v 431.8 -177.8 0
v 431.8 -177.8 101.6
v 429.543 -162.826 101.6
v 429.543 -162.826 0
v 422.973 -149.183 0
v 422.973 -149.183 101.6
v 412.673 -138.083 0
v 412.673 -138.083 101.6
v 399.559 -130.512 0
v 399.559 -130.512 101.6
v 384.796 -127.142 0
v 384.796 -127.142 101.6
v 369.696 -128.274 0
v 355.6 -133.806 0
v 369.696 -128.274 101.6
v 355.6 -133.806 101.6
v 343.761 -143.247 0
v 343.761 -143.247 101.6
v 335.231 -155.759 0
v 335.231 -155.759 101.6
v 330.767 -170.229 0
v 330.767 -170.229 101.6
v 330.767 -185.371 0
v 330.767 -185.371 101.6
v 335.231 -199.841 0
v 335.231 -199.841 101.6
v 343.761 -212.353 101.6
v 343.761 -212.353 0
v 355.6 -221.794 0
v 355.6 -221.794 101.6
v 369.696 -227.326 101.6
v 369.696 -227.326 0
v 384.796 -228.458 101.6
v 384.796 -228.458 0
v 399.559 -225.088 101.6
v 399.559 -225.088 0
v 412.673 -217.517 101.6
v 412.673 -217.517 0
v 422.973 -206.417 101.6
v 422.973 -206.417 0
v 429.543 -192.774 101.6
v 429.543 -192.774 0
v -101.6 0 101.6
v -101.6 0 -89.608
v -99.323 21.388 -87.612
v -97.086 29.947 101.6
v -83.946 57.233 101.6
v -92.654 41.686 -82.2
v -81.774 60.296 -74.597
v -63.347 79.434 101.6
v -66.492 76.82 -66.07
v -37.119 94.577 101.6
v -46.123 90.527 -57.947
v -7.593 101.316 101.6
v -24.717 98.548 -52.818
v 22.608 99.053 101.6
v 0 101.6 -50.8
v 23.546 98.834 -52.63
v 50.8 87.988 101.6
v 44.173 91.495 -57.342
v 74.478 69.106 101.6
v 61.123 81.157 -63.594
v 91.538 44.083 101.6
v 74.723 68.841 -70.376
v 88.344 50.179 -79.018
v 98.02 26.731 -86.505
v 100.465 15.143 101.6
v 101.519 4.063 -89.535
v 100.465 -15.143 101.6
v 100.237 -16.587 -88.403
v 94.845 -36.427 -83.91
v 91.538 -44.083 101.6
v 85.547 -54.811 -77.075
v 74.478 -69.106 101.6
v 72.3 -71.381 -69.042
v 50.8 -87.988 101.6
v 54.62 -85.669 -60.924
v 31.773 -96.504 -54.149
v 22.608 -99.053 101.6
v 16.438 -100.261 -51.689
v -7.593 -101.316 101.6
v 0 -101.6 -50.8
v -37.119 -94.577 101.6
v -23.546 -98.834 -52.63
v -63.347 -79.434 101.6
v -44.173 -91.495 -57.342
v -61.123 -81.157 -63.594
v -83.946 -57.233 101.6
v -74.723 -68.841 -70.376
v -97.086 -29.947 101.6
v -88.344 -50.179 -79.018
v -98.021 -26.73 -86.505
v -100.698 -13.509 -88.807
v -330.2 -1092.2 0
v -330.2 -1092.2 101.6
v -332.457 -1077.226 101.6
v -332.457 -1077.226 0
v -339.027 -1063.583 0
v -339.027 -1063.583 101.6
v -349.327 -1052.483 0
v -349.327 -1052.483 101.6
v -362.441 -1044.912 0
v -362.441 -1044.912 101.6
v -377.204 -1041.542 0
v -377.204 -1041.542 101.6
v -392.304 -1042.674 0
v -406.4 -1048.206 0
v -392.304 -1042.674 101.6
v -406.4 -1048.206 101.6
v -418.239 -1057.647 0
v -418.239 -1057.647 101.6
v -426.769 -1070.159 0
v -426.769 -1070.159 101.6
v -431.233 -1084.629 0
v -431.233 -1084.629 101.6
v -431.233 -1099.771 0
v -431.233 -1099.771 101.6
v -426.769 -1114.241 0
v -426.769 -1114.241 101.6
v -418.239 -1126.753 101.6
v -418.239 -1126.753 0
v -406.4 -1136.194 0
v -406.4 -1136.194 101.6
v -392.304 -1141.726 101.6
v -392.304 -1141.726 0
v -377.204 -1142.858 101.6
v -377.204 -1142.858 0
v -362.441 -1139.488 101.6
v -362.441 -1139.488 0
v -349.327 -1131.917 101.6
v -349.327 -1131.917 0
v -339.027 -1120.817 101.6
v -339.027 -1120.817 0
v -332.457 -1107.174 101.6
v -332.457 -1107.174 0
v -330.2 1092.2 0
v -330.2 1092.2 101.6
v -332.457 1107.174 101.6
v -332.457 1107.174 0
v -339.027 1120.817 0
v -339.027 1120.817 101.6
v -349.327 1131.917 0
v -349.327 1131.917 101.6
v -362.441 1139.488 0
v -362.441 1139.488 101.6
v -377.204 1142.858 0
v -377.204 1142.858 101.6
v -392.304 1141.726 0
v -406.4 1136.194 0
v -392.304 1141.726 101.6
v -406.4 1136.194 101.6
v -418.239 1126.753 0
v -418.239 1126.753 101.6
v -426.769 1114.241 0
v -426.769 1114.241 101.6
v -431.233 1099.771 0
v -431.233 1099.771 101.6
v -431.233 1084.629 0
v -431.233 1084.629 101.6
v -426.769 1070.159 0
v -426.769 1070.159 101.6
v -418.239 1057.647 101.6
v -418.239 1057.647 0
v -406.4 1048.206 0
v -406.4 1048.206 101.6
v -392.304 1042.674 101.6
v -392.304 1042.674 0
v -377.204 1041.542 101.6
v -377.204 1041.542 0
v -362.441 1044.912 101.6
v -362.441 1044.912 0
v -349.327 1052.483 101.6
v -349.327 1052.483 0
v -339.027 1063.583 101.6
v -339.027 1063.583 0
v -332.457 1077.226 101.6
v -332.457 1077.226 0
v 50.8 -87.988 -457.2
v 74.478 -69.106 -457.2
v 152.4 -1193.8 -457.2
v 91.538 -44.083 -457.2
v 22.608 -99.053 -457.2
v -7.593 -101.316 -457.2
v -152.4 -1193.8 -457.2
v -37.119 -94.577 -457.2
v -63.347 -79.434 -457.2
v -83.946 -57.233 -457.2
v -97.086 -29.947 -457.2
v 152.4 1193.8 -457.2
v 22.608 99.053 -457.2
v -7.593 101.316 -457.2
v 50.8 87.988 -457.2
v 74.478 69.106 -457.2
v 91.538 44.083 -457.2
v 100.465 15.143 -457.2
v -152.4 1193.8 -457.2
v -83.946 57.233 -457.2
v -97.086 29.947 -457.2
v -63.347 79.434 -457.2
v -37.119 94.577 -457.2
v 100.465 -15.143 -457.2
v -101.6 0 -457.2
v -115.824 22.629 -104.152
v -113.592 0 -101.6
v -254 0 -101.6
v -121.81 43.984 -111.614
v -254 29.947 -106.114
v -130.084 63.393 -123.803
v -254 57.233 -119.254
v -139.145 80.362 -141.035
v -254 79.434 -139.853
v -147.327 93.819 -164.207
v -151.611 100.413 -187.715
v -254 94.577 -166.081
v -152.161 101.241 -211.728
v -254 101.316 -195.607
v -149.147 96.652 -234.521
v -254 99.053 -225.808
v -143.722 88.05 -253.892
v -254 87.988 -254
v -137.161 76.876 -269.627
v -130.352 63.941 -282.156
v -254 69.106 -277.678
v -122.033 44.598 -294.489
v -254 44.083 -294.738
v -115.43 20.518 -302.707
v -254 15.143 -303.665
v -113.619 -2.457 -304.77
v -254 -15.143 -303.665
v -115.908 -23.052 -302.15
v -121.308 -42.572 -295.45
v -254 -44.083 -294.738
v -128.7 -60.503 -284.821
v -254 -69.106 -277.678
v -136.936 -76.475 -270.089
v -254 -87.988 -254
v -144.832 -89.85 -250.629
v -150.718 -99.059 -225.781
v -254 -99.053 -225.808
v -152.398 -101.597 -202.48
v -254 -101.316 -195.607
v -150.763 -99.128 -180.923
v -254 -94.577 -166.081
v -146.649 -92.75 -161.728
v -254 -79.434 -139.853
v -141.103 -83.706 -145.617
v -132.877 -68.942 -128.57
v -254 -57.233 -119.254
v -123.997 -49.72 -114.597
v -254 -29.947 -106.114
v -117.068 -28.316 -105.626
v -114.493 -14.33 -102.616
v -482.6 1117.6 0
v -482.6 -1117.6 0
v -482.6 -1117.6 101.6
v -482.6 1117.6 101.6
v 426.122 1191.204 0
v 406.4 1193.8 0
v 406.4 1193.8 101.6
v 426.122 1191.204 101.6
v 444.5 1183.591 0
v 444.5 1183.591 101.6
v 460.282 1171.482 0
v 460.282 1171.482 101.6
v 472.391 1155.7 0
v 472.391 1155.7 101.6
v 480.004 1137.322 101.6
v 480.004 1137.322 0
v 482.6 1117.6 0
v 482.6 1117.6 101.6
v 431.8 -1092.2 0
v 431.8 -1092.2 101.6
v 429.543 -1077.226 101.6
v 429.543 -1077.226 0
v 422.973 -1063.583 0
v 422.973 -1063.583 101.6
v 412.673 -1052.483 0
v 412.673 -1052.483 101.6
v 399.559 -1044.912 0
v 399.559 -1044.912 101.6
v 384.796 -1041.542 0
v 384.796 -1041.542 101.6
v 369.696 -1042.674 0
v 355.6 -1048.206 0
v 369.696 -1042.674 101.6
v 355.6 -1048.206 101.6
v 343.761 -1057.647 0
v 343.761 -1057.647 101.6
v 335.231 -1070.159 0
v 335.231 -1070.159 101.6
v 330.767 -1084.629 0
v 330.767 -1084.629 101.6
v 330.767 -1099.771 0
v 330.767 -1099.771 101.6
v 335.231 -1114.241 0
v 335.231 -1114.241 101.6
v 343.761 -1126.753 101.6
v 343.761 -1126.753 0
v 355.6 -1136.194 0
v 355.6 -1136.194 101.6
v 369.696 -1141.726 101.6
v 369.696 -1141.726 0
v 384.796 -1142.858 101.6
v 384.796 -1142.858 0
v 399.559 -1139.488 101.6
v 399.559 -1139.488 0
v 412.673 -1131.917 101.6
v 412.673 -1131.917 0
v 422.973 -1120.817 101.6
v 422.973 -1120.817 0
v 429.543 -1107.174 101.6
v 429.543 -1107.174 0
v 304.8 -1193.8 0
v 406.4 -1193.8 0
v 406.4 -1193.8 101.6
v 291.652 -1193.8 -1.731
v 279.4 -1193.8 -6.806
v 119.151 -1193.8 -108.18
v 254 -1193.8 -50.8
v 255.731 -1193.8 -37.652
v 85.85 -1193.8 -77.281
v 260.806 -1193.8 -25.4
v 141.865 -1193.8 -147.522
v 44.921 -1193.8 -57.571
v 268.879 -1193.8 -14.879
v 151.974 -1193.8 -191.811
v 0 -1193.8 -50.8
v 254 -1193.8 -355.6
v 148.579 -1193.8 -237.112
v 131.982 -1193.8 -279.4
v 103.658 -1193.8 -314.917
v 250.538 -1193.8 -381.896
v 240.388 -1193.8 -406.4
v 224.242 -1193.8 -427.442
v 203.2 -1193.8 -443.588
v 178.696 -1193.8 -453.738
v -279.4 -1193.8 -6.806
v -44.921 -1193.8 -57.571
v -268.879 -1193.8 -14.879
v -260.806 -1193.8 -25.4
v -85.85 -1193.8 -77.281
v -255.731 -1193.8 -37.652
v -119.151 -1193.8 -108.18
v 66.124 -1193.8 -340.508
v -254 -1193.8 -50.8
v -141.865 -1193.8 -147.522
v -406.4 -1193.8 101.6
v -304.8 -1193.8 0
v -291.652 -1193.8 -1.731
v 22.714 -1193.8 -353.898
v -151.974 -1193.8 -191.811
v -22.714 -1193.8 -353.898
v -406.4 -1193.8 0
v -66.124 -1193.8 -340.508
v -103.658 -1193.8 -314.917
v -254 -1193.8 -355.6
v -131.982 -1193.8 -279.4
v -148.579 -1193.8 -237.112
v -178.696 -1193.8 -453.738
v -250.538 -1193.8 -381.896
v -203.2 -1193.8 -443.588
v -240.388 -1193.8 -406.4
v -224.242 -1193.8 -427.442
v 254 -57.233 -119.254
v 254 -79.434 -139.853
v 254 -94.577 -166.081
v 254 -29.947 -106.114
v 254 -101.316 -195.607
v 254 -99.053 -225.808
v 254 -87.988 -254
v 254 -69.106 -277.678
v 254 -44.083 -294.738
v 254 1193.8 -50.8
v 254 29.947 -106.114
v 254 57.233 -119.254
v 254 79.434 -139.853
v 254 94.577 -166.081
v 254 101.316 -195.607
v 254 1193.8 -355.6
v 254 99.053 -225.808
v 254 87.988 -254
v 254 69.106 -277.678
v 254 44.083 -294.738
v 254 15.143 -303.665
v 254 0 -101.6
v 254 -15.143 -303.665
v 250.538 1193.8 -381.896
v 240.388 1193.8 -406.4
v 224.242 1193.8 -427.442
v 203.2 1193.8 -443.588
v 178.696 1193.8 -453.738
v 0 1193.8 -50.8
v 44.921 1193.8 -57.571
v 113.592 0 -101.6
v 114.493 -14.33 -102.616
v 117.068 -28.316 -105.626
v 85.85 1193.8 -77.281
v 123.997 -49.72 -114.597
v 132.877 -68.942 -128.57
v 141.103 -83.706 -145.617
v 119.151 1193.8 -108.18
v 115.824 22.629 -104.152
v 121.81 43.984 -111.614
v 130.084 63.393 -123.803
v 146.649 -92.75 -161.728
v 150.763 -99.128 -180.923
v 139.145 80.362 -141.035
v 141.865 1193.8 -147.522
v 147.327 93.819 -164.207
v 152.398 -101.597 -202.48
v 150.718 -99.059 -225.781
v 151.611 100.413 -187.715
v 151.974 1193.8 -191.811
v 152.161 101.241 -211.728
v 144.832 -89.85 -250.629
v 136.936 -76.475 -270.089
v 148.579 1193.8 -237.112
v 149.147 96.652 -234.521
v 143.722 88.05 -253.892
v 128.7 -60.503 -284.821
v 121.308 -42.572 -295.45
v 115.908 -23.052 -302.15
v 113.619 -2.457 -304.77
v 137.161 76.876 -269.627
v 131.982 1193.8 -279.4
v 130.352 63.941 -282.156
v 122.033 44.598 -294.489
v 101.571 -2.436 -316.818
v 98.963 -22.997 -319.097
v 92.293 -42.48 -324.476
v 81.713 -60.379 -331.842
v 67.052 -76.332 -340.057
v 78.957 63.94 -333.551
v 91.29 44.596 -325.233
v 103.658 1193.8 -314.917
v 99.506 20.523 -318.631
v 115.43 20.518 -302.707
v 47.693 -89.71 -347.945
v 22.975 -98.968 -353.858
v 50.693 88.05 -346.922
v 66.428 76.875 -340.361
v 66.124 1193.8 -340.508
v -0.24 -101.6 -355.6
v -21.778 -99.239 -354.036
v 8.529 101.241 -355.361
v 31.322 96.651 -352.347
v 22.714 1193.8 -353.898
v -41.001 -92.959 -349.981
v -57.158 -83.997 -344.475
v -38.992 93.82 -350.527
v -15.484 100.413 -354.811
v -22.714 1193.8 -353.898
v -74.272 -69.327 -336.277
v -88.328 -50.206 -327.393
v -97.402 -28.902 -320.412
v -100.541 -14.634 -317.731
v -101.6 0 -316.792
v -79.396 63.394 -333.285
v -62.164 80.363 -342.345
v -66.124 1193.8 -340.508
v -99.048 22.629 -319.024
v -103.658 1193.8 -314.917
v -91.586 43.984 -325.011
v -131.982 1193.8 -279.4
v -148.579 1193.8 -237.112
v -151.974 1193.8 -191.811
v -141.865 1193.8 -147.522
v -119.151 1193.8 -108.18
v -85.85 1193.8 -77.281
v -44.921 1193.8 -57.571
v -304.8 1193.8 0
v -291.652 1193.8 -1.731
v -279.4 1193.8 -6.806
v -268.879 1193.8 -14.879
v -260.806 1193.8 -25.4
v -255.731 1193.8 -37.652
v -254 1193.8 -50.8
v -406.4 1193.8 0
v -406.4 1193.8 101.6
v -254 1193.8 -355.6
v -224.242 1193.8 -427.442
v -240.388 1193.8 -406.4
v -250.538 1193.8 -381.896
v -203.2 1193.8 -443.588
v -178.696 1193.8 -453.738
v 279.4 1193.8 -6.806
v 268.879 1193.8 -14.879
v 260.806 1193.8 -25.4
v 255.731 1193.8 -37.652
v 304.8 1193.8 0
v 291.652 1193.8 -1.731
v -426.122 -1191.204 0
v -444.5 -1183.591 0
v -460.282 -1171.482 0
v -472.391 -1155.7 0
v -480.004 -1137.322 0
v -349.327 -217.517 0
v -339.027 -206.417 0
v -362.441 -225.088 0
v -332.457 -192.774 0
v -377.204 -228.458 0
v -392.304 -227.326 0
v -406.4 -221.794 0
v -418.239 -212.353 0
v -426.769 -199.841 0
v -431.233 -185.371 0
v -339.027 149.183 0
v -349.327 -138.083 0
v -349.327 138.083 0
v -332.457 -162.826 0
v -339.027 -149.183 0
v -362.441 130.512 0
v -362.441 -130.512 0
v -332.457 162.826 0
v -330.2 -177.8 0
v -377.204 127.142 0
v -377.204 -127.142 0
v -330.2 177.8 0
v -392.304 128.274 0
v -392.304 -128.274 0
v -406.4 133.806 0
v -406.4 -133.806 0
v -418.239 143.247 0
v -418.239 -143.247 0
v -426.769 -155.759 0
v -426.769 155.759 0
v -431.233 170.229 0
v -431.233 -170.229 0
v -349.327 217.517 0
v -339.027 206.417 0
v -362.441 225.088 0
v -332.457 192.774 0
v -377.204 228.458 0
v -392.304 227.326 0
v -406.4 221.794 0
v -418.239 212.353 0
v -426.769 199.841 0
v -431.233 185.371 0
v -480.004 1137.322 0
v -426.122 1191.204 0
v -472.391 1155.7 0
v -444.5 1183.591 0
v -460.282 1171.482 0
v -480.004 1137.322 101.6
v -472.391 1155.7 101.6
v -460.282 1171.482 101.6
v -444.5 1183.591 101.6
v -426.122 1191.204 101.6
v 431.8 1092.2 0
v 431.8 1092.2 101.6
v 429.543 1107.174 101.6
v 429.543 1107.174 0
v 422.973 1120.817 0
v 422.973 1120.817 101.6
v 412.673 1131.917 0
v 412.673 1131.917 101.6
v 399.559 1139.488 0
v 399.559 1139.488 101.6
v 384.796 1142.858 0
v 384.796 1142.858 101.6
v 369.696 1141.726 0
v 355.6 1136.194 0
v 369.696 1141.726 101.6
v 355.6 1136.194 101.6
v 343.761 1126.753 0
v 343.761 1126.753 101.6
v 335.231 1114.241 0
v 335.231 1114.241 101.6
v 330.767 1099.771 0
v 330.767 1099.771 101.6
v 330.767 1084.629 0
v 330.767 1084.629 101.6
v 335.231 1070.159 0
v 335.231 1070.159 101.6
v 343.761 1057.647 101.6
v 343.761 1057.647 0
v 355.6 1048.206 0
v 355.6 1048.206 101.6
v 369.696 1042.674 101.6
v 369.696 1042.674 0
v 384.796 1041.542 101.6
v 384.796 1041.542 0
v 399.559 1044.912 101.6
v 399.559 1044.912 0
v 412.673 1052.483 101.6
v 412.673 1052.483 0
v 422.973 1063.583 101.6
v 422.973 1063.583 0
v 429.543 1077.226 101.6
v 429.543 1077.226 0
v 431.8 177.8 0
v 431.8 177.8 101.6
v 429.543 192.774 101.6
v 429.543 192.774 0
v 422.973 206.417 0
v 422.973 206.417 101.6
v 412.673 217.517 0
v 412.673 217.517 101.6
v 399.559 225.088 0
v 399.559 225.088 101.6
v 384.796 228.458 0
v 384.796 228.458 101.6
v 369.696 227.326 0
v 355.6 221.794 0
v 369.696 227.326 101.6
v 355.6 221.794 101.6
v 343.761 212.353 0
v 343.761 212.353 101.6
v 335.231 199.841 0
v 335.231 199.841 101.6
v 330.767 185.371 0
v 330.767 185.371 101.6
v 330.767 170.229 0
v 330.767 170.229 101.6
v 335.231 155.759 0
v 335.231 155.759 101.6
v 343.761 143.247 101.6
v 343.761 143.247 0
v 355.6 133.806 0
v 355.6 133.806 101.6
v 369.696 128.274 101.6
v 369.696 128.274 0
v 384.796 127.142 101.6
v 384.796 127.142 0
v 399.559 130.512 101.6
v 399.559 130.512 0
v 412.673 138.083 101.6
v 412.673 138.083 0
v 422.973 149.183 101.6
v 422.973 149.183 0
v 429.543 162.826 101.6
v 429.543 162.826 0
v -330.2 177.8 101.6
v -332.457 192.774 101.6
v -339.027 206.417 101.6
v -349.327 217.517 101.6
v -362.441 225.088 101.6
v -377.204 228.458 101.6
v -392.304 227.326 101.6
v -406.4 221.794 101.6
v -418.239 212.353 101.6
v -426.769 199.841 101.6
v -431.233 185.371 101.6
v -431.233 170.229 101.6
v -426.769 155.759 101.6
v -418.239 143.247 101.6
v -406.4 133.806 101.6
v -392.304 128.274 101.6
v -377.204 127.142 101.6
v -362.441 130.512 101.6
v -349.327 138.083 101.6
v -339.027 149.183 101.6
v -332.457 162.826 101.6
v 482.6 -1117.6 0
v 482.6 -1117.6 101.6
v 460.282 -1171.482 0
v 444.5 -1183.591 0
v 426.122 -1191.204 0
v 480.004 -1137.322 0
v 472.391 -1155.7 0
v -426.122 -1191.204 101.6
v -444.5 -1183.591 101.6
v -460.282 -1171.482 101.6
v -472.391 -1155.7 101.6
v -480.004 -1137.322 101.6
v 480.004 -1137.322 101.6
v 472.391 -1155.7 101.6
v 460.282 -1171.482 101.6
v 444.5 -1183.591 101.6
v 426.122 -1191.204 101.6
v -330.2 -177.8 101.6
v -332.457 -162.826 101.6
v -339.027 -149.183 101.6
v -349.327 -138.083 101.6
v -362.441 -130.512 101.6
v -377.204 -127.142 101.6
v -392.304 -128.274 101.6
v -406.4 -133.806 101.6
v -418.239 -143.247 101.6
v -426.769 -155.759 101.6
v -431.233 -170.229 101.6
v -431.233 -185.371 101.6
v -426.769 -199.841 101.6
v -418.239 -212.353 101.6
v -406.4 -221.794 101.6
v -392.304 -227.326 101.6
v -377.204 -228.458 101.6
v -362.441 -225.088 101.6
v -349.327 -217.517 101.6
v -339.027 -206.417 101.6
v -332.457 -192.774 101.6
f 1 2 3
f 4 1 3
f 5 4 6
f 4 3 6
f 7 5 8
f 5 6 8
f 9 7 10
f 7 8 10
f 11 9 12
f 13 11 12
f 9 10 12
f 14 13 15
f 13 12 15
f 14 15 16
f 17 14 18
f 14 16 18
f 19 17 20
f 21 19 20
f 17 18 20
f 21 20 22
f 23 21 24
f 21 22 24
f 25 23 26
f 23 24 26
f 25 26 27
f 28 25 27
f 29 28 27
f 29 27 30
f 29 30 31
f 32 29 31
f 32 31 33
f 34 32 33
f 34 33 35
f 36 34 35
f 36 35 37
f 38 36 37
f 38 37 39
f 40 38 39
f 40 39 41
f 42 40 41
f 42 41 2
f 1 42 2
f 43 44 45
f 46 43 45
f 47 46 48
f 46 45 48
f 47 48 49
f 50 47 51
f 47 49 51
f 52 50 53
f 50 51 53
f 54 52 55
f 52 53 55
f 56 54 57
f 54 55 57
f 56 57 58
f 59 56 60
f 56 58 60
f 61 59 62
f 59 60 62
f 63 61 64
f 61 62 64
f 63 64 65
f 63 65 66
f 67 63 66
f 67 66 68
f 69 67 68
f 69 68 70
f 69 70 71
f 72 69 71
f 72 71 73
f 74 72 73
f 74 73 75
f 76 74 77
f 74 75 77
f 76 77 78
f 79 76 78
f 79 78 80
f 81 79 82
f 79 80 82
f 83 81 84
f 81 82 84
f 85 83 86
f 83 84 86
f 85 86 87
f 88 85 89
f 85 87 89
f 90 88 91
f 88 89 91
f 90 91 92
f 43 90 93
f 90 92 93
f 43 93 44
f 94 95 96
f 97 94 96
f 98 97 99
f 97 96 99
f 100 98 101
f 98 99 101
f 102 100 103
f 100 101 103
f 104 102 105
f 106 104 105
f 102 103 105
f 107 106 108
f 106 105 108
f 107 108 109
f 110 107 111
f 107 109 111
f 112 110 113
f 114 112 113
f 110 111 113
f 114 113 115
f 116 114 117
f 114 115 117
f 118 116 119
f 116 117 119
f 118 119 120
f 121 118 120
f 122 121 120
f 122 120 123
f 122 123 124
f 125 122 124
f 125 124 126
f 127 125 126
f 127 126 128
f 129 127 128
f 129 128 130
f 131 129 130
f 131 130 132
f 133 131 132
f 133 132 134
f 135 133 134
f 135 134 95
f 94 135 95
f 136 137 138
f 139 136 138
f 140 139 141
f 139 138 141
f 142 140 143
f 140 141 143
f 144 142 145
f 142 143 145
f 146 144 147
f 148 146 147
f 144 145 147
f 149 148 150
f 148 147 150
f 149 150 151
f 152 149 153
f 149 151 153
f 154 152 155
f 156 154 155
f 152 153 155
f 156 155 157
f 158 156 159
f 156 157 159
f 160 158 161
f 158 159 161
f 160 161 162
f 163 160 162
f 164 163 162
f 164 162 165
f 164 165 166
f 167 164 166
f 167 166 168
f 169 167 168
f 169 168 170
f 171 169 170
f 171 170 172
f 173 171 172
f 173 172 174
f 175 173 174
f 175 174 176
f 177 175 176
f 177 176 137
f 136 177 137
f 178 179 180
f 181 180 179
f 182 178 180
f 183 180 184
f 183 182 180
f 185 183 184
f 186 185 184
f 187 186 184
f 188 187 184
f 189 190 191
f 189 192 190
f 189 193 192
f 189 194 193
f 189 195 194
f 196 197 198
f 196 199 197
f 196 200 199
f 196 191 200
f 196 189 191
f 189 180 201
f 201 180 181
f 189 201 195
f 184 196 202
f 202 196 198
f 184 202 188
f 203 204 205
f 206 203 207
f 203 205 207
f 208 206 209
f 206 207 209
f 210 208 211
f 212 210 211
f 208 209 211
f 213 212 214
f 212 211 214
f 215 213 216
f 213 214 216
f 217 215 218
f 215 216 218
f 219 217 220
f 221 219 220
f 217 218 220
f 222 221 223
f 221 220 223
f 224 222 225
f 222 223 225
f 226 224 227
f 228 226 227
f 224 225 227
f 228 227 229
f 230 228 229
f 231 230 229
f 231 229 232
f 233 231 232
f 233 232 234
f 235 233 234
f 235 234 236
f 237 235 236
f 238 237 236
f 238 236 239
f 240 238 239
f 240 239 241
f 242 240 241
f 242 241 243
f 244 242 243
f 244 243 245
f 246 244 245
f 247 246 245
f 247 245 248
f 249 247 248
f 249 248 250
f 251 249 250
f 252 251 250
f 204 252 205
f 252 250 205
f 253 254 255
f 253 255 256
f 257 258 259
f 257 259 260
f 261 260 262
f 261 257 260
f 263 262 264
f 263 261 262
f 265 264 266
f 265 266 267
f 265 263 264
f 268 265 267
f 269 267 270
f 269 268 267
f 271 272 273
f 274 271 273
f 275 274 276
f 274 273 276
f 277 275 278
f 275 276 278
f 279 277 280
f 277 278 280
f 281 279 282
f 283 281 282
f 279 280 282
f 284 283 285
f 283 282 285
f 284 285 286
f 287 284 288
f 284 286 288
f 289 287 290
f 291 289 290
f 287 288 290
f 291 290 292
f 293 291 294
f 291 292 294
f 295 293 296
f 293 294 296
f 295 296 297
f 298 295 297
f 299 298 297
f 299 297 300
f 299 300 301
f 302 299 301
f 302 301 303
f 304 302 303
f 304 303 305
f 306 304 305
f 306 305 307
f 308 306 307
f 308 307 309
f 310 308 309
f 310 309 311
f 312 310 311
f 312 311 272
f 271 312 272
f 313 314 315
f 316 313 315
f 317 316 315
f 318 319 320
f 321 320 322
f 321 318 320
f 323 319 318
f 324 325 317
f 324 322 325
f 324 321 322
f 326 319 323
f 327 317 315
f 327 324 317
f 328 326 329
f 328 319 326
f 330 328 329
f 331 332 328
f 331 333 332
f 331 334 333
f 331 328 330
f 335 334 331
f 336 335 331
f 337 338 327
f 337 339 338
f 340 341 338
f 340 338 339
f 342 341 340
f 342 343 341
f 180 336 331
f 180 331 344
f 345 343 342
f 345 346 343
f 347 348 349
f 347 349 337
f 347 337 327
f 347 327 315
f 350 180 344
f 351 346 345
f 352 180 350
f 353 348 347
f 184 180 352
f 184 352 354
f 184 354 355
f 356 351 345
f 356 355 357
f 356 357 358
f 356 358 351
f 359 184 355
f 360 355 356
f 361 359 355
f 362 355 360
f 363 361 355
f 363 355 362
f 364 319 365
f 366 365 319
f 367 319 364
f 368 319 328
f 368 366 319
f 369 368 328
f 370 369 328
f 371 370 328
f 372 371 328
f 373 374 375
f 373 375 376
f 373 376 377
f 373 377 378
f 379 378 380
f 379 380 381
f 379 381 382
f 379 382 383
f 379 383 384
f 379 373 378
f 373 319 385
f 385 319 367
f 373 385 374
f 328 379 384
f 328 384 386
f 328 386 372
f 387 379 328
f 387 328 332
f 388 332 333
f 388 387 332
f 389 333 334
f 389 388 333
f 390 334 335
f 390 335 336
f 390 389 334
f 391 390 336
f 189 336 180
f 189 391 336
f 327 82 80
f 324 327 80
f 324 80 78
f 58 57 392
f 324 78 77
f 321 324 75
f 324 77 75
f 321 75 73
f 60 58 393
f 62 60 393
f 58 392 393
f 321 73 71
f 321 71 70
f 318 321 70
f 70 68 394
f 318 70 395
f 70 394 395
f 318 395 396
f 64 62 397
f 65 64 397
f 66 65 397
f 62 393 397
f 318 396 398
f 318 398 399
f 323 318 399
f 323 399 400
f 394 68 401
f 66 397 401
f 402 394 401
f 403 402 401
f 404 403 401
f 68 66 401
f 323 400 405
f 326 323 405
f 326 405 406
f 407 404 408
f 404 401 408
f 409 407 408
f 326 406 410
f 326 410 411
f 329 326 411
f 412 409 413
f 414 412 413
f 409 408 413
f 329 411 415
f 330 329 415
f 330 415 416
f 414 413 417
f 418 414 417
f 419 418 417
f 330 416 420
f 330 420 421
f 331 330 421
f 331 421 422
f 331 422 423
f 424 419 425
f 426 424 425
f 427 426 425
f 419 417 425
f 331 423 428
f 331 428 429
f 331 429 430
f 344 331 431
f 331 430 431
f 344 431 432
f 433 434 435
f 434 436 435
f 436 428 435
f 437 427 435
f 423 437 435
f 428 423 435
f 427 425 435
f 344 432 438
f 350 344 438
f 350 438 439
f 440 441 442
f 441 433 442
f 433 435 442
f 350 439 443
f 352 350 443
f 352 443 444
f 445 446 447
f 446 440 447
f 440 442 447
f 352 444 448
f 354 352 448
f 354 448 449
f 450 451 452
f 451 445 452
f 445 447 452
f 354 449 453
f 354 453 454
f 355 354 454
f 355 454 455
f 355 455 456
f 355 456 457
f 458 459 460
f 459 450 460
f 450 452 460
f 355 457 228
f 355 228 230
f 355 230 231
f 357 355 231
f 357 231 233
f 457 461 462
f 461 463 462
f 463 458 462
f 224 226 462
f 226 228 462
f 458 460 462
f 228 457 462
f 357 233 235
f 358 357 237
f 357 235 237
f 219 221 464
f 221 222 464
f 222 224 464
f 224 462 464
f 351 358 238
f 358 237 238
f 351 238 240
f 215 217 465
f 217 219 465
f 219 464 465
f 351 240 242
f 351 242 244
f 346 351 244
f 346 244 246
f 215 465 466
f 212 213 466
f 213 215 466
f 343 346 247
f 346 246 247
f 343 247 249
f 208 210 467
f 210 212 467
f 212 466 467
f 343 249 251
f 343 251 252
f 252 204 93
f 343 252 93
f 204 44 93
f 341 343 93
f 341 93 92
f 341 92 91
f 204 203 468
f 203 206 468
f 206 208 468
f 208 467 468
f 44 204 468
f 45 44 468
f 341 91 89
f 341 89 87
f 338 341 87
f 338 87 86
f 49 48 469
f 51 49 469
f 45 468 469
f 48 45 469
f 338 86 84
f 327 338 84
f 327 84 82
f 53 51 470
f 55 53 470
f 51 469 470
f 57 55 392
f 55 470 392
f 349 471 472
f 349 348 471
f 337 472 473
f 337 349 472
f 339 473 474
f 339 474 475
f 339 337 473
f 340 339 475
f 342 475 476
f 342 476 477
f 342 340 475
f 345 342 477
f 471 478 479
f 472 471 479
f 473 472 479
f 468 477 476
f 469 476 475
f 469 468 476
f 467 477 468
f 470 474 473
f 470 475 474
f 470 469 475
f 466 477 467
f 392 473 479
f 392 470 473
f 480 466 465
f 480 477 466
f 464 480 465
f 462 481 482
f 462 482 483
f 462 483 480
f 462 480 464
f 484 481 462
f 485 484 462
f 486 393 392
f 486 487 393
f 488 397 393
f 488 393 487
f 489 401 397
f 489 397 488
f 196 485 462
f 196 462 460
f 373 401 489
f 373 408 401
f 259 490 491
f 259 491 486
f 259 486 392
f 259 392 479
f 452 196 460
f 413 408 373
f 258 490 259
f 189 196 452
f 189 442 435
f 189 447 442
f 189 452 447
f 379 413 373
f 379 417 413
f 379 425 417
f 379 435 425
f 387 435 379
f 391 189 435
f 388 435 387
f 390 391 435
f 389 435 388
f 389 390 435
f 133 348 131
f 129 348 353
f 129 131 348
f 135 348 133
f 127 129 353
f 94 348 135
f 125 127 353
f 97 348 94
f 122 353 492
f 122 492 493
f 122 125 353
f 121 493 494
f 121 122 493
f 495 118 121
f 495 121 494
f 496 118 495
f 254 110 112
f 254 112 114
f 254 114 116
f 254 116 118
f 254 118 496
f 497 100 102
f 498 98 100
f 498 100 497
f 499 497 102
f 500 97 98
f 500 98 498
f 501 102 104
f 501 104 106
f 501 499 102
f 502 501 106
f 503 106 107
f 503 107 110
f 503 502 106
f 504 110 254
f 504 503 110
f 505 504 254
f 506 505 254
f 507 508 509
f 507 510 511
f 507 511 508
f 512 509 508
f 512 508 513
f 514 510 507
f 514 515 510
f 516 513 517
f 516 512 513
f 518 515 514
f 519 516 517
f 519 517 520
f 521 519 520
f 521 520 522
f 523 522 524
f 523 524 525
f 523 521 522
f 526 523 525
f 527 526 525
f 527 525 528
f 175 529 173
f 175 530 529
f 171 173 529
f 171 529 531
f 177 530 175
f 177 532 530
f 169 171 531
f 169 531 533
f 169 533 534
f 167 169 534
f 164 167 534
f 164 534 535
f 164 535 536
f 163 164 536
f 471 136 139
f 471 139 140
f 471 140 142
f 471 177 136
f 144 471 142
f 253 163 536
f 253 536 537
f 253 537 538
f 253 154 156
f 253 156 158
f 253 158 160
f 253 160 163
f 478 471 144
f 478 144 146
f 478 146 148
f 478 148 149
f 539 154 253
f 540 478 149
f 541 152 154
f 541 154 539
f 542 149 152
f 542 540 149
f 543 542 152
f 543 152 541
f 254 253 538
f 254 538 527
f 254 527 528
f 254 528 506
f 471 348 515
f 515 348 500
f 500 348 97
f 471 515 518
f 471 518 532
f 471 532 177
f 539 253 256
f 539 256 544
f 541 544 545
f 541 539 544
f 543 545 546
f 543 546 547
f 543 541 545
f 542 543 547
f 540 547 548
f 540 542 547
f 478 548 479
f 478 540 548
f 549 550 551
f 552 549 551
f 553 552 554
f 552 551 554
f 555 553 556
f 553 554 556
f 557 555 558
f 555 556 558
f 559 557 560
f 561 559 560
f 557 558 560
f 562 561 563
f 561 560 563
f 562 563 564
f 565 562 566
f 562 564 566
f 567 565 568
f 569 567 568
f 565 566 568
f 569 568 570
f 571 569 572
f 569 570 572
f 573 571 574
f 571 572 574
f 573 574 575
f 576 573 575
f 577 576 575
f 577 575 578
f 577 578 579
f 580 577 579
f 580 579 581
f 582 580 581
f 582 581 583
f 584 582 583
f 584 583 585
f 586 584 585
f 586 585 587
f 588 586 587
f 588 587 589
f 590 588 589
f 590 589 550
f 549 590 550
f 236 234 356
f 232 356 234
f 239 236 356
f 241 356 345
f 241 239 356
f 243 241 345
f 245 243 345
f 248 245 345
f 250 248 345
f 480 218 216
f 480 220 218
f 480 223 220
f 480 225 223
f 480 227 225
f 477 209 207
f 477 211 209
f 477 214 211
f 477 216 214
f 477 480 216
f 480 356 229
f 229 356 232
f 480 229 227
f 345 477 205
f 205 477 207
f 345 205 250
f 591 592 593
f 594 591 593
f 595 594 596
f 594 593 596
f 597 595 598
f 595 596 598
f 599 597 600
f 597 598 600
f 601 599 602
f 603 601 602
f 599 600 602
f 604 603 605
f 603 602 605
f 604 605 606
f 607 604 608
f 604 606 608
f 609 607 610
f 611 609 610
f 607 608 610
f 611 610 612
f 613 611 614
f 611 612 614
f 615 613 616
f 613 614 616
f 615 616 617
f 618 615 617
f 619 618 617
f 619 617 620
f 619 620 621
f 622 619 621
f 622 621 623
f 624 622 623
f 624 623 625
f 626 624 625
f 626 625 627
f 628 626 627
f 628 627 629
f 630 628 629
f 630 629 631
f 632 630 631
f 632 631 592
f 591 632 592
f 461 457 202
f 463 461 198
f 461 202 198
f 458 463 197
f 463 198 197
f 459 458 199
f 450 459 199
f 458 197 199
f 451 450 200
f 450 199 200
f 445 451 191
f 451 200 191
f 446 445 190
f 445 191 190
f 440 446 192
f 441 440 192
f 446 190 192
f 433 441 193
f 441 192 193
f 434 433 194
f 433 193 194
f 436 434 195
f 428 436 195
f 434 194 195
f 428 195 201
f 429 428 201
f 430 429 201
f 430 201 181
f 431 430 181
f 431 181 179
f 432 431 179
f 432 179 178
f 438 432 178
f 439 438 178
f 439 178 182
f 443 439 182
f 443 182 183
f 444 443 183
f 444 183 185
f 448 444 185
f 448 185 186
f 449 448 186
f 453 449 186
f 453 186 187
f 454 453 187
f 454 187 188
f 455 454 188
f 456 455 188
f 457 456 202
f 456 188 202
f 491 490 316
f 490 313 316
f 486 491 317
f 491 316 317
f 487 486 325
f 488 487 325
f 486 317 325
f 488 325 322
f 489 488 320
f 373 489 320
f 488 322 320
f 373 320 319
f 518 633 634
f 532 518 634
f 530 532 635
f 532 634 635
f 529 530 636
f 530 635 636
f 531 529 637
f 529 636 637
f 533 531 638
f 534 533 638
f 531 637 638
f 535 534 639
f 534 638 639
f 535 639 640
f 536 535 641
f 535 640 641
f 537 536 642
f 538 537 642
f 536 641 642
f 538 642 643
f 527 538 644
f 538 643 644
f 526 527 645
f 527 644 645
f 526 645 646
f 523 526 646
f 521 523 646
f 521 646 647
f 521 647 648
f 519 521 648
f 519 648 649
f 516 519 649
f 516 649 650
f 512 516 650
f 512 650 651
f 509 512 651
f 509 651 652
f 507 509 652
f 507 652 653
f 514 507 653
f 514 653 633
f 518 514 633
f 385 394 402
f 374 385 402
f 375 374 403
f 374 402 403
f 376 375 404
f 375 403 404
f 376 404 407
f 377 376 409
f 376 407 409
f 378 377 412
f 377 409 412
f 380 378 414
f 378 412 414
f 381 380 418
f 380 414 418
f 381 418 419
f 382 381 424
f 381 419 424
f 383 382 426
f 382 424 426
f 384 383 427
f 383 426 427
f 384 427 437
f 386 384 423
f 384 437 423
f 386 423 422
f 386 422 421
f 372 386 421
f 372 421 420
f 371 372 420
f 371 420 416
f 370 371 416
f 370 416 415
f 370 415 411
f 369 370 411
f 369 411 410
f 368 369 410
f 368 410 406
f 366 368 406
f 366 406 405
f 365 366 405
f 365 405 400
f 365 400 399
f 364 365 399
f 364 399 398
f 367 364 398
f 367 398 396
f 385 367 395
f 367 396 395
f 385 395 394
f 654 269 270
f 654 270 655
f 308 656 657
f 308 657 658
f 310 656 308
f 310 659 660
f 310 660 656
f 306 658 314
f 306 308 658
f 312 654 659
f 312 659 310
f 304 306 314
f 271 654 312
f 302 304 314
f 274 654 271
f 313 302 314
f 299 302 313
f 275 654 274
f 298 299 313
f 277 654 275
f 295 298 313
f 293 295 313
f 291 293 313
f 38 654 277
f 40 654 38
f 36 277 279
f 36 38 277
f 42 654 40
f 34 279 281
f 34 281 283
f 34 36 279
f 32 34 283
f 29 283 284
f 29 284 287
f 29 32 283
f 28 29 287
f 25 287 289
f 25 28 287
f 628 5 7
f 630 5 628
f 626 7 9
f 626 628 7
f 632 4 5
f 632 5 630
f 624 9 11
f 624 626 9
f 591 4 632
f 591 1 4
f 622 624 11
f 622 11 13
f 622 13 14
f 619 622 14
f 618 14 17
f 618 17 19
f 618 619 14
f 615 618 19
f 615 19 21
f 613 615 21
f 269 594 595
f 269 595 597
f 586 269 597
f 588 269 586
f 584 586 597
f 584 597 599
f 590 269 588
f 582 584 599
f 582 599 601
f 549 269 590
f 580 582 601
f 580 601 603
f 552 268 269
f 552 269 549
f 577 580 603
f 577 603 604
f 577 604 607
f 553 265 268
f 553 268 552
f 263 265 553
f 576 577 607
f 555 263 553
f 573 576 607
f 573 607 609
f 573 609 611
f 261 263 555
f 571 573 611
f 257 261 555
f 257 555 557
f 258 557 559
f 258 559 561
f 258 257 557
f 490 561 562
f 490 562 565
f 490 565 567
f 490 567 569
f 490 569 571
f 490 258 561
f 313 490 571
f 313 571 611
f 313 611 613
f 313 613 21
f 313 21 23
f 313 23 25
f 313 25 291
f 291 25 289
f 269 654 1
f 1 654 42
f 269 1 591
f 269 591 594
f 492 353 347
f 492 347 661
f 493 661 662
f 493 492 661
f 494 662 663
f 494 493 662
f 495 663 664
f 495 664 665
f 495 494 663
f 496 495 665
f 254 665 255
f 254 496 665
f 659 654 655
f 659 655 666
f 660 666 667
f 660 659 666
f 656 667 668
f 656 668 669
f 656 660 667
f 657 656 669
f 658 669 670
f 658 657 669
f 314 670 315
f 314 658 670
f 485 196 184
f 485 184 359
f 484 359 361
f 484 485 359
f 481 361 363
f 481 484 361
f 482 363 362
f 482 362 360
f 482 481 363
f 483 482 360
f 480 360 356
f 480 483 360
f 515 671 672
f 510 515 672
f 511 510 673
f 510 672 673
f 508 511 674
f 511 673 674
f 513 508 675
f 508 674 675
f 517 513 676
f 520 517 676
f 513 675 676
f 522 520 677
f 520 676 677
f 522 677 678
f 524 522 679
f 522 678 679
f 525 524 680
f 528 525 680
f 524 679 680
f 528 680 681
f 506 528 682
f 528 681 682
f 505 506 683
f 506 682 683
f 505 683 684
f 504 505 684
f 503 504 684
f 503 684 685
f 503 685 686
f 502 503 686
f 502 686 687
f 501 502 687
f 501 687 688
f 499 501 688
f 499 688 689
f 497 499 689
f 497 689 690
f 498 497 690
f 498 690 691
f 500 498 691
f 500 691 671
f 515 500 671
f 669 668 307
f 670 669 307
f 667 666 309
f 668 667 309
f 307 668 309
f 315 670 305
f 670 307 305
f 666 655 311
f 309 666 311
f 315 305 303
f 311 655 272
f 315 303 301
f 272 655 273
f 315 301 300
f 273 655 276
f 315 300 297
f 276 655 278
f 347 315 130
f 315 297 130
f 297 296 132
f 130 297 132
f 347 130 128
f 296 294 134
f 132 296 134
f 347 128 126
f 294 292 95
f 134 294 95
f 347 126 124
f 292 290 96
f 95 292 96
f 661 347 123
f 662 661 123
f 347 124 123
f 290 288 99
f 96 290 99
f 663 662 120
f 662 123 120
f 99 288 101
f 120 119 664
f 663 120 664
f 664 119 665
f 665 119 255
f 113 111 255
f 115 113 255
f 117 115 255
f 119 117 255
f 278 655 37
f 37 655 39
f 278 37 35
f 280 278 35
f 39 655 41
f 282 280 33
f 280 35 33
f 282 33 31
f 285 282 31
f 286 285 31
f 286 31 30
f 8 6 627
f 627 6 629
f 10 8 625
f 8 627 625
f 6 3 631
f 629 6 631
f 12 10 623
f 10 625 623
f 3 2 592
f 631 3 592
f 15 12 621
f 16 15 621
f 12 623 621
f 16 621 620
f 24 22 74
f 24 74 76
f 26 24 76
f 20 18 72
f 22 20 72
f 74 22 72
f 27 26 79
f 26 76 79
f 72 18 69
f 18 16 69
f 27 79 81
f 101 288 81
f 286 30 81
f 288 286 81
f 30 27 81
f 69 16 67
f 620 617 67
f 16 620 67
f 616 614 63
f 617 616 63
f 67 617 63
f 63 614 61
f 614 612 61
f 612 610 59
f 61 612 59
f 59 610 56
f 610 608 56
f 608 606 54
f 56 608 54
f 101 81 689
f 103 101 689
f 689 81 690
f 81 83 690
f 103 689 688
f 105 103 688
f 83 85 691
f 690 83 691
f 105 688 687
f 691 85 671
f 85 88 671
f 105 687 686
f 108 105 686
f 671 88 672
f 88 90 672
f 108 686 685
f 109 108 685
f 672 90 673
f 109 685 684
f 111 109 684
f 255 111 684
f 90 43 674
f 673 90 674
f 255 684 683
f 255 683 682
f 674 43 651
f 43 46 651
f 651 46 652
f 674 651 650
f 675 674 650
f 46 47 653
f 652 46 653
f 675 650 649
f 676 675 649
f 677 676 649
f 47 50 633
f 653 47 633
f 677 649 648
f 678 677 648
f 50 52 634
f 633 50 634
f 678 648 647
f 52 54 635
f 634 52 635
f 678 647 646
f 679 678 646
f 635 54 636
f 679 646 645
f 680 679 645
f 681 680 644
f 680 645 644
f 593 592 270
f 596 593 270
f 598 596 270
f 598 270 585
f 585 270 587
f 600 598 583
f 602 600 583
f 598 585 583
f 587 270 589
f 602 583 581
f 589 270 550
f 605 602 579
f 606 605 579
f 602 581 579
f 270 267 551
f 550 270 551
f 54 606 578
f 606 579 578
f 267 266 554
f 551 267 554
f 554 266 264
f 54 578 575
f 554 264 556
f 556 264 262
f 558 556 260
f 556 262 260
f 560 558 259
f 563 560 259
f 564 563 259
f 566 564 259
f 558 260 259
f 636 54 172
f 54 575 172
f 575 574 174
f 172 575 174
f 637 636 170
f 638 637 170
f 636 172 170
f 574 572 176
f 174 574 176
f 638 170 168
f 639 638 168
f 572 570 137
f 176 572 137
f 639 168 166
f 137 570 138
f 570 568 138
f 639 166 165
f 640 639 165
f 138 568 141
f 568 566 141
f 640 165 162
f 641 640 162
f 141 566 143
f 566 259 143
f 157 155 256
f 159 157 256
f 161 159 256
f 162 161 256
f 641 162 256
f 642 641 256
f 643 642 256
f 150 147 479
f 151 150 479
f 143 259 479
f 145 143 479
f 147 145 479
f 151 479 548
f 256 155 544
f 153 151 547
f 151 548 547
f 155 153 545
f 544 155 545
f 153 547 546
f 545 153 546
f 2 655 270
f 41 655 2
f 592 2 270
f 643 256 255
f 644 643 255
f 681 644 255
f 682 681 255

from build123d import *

# Parameters (mm, degrees)
BOSS_EXTRUDE2_DEPTH = 101.6
SKETCH2_R           = 50.8
CUT_EXTRUDE1_DEPTH  = 1292.659304925
SKETCH3_R           = 152.4
BOSS_EXTRUDE3_DEPTH = 2387.6
FILLET1_R           = 50.8
SKETCH4_R           = 101.6
CUT_EXTRUDE2_DEPTH  = 1404.680390972
SKETCH5_R           = 101.6
CUT_EXTRUDE3_DEPTH  = 1476.388030428


with BuildPart() as part:
    # Sketch1 → Boss-Extrude2 (new body)
    with BuildSketch(Plane.XY):
        with BuildLine():
            Line((-406.4, 1193.8), (406.4, 1193.8))
            ThreePointArc((406.4, 1193.8), (460.281536726, 1171.481536726), (482.6, 1117.6))
            Line((482.6, 1117.6), (482.6, -1117.6))
            ThreePointArc((482.6, -1117.6), (460.281536726, -1171.481536726), (406.4, -1193.8))
            Line((406.4, -1193.8), (-406.4, -1193.8))
            ThreePointArc((-406.4, -1193.8), (-460.281536726, -1171.481536726), (-482.6, -1117.6))
            Line((-482.6, -1117.6), (-482.6, 1117.6))
            ThreePointArc((-482.6, 1117.6), (-460.281536726, 1171.481536726), (-406.4, 1193.8))
        make_face()
    extrude(amount=BOSS_EXTRUDE2_DEPTH)

    # Sketch2 → Cut-Extrude1 (cut, through all)
    with BuildSketch(Plane.XY.offset(101.6)):
        with Locations((-381, 1092.2)):
            Circle(SKETCH2_R)
        with Locations((-381, 177.8)):
            Circle(SKETCH2_R)
        with Locations((-381, -177.8)):
            Circle(SKETCH2_R)
        with Locations((-381, -1092.2)):
            Circle(SKETCH2_R)
        with Locations((381, 1092.2)):
            Circle(SKETCH2_R)
        with Locations((381, 177.8)):
            Circle(SKETCH2_R)
        with Locations((381, -177.8)):
            Circle(SKETCH2_R)
        with Locations((381, -1092.2)):
            Circle(SKETCH2_R)
    extrude(amount=-CUT_EXTRUDE1_DEPTH, mode=Mode.SUBTRACT)

    # Sketch3 → Boss-Extrude3 (add)
    with BuildSketch(Plane(origin=(0, 1193.8, 0), x_dir=(1, 0, 0), z_dir=(0, 1, 0))):
        with BuildLine():
            Line((-254, 0), (254, 0))
            Line((254, 0), (254, 355.6))
            ThreePointArc((254, 355.6), (224.242048969, 427.442048969), (152.4, 457.2))
            Line((152.4, 457.2), (-152.4, 457.2))
            ThreePointArc((-152.4, 457.2), (-224.242048969, 427.442048969), (-254, 355.6))
            Line((-254, 355.6), (-254, 0))
        make_face()
        with Locations(Location((0, 203.2, 0), (0, 0, 270))):
            Circle(SKETCH3_R, mode=Mode.SUBTRACT)
    extrude(amount=-BOSS_EXTRUDE3_DEPTH)

    # Fillet1
    fillet1_edges = [part.edges().sort_by_distance(p)[0] for p in [
        (-254, 0, 0),
        (254, 0, 0),
    ]]
    fillet(fillet1_edges, radius=FILLET1_R)

    # Sketch4 → Cut-Extrude2 (cut, through all)
    with BuildSketch(Plane(origin=(0, 0, -457.2), x_dir=(-1, 0, 0), z_dir=(0, 0, -1))):
        Circle(SKETCH4_R)
    extrude(amount=-CUT_EXTRUDE2_DEPTH, mode=Mode.SUBTRACT)

    # Sketch5 → Cut-Extrude3 (cut, through all)
    with BuildSketch(Plane.ZY.offset(254)):
        with Locations((-203.2, 0)):
            Circle(SKETCH5_R)
    extrude(amount=-CUT_EXTRUDE3_DEPTH, mode=Mode.SUBTRACT)


solid = part.part
